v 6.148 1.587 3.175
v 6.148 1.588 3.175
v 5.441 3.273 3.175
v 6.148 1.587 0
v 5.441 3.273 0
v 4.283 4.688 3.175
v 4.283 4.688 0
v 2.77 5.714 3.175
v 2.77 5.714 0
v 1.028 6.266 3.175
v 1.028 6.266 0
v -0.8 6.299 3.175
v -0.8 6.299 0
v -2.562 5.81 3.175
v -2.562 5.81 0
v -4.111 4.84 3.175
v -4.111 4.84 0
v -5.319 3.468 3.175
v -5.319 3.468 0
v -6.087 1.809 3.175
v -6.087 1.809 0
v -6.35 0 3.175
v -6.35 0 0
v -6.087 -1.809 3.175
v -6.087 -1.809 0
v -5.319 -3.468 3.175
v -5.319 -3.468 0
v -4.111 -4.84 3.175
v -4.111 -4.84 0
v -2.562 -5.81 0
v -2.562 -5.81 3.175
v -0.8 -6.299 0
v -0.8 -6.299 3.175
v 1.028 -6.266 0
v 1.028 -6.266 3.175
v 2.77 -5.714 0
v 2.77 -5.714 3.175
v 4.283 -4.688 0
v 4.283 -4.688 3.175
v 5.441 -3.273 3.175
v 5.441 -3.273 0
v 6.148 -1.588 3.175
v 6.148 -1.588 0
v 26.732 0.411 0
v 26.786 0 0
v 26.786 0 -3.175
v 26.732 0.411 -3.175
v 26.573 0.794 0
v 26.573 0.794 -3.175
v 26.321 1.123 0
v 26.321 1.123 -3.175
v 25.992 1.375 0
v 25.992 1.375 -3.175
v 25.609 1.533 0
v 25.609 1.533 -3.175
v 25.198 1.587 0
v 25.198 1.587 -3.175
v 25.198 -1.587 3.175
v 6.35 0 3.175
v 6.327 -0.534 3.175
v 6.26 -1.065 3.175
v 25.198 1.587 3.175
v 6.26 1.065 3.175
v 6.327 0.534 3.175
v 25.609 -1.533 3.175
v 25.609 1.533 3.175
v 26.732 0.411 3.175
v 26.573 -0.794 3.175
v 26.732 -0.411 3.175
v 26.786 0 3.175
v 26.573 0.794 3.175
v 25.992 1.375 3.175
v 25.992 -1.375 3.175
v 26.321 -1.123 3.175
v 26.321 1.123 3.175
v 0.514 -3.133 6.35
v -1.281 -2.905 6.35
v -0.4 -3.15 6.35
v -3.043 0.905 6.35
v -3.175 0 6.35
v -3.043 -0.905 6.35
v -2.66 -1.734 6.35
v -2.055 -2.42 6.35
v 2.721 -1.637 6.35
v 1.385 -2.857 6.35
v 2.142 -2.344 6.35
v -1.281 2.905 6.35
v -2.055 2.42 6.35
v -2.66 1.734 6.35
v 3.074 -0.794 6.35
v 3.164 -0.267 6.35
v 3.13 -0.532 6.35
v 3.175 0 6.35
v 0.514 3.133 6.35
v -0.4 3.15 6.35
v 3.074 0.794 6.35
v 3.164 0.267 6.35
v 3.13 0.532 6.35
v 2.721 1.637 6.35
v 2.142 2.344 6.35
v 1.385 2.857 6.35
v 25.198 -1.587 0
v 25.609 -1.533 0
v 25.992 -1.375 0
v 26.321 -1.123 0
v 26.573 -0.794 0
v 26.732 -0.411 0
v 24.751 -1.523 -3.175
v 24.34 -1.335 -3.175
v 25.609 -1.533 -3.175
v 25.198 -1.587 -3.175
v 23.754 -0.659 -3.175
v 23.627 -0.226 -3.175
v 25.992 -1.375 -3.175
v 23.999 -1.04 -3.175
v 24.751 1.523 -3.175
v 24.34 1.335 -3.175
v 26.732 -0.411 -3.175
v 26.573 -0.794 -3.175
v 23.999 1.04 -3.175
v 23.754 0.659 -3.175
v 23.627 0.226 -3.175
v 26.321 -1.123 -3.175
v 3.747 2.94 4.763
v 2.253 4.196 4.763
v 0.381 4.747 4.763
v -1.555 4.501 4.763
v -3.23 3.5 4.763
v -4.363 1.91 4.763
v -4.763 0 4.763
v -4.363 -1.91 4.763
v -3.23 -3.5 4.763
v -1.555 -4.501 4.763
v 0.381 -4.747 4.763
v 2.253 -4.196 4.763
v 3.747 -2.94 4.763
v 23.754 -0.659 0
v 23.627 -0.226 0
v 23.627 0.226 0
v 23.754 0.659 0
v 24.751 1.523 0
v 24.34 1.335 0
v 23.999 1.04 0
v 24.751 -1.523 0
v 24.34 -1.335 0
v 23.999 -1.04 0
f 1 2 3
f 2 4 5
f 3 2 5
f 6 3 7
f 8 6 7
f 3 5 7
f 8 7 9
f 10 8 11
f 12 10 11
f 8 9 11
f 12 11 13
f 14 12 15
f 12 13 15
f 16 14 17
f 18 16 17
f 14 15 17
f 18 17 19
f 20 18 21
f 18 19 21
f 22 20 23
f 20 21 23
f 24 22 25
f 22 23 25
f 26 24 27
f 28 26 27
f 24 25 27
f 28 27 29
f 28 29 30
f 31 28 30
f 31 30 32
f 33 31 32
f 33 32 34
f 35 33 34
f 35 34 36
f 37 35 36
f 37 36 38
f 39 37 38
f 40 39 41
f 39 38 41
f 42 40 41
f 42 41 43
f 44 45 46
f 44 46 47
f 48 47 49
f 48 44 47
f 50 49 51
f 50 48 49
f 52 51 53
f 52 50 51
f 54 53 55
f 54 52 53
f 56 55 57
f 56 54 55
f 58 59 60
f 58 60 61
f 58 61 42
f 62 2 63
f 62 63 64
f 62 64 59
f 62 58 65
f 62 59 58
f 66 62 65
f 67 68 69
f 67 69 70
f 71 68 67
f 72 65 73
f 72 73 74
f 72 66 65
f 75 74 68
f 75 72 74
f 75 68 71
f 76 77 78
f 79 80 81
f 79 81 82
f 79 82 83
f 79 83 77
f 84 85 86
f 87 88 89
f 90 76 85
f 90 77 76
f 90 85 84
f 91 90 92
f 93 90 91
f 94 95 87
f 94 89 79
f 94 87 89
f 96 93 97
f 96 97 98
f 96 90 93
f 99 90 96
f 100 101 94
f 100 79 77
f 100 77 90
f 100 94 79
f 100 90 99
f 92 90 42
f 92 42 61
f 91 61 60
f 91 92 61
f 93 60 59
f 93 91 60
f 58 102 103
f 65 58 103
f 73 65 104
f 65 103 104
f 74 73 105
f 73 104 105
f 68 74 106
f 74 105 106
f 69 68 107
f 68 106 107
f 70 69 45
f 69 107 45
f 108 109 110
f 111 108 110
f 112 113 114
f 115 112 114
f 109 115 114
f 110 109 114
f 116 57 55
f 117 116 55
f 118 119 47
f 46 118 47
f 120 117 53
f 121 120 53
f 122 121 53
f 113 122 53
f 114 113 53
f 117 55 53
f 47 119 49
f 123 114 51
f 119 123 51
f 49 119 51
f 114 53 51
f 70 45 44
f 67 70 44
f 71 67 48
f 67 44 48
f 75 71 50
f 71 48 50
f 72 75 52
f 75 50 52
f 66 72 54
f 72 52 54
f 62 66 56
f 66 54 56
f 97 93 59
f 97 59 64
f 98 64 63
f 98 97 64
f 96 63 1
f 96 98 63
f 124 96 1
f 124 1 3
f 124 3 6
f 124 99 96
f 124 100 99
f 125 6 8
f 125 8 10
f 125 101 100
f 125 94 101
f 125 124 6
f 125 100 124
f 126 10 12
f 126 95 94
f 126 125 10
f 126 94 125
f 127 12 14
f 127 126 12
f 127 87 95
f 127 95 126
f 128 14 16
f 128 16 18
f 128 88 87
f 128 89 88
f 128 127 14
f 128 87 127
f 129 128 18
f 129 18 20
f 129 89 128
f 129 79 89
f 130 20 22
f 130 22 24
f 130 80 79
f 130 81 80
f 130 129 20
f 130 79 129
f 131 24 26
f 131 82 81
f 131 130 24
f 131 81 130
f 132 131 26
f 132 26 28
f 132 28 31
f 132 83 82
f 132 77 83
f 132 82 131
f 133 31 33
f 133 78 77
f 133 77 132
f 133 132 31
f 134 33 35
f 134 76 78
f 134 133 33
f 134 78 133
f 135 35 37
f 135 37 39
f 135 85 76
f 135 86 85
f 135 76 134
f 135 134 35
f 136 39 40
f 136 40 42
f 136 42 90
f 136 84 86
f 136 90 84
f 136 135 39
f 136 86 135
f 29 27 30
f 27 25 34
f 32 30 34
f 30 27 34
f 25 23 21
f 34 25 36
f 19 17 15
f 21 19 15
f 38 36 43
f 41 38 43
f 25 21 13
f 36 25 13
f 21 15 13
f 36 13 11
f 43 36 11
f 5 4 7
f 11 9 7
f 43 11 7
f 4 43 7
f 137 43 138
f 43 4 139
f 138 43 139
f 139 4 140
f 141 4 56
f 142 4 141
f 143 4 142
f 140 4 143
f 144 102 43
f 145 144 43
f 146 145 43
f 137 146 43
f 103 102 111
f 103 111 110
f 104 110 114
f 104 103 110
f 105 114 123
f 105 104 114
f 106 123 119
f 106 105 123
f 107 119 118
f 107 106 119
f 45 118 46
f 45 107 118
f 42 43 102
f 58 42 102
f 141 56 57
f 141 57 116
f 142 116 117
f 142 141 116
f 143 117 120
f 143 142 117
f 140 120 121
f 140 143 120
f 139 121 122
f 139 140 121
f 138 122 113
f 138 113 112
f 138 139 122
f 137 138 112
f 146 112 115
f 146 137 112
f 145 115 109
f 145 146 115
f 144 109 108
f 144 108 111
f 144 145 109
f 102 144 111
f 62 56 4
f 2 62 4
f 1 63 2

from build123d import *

# Parameters (mm, degrees)
F1_DEPTH = 6.35
F2_DEPTH = 3.175
F3_SIZE  = 3.17499
F4_DEPTH = 3.175


# Not quite as in the source:
# - a fillet or chamfer is up to 0.001 mm smaller than in the source, because OpenCascade refuses the exact size


with BuildPart() as f1:
    # F0 (on Top) → F1 (new body)
    with BuildSketch(Plane.XY):
        with BuildLine():
            Line((6.1483610621, 0), (6.1483610621, 1.5875))
            ThreePointArc((6.1483610621, 1.5875), (-6.35, 0), (6.1483610621, -1.5875))
            Line((6.1483610621, -1.5875), (6.1483610621, 0))
        make_face()
        with BuildLine():
            ThreePointArc((6.1483610621, -1.5875), (6.2993885713, -0.8001272573), (6.35, 0))
            ThreePointArc((6.35, 0), (6.2993885713, 0.8001272573), (6.1483610621, 1.5875))
            Line((6.1483610621, 1.5875), (6.1483610621, 0))
            Line((6.1483610621, 0), (6.1483610621, -1.5875))
        make_face()
    extrude(amount=F1_DEPTH)

    # F0 (on Top) → F2 (join)
    with BuildSketch(Plane.XY):
        with BuildLine():
            ThreePointArc((6.1483610621, 1.5875), (6.2993885713, 0.8001272573), (6.35, 0))
            ThreePointArc((6.35, 0), (6.2993885713, -0.8001272573), (6.1483610621, -1.5875))
            Line((6.1483610621, -1.5875), (25.1983610621, -1.5875))
            ThreePointArc((25.1983610621, -1.5875), (23.6108610621, 0), (25.1983610621, 1.5875))
            Line((25.1983610621, 1.5875), (6.1483610621, 1.5875))
        make_face()
        with BuildLine():
            ThreePointArc((26.7858610621, 0), (26.3208930772, 1.1225320151), (25.1983610621, 1.5875))
            Line((25.1983610621, 1.5875), (25.1983610621, -1.5875))
            ThreePointArc((25.1983610621, -1.5875), (26.3208930772, -1.1225320151), (26.7858610621, 0))
        make_face()
        with BuildLine():
            Line((25.1983610621, -1.5875), (25.1983610621, 1.5875))
            ThreePointArc((25.1983610621, 1.5875), (23.6108610621, 0), (25.1983610621, -1.5875))
        make_face()
    extrude(amount=F2_DEPTH)

    # F3 (size 3.175 in the source; OpenCascade refuses exactly that, so slightly less here)
    f3_edges = [f1.edges().sort_by_distance(p)[0] for p in [
        (-6.148361, 1.5875, 6.35),
    ]]
    chamfer(f3_edges, length=F3_SIZE)

    # F0 (on Top) → F4 (join)
    with BuildSketch(Plane.XY):
        with BuildLine():
            ThreePointArc((26.7858610621, 0), (26.3208930772, 1.1225320151), (25.1983610621, 1.5875))
            Line((25.1983610621, 1.5875), (25.1983610621, -1.5875))
            ThreePointArc((25.1983610621, -1.5875), (26.3208930772, -1.1225320151), (26.7858610621, 0))
        make_face()
        with BuildLine():
            Line((25.1983610621, -1.5875), (25.1983610621, 1.5875))
            ThreePointArc((25.1983610621, 1.5875), (23.6108610621, 0), (25.1983610621, -1.5875))
        make_face()
    extrude(amount=-F4_DEPTH)


solid = f1.part
